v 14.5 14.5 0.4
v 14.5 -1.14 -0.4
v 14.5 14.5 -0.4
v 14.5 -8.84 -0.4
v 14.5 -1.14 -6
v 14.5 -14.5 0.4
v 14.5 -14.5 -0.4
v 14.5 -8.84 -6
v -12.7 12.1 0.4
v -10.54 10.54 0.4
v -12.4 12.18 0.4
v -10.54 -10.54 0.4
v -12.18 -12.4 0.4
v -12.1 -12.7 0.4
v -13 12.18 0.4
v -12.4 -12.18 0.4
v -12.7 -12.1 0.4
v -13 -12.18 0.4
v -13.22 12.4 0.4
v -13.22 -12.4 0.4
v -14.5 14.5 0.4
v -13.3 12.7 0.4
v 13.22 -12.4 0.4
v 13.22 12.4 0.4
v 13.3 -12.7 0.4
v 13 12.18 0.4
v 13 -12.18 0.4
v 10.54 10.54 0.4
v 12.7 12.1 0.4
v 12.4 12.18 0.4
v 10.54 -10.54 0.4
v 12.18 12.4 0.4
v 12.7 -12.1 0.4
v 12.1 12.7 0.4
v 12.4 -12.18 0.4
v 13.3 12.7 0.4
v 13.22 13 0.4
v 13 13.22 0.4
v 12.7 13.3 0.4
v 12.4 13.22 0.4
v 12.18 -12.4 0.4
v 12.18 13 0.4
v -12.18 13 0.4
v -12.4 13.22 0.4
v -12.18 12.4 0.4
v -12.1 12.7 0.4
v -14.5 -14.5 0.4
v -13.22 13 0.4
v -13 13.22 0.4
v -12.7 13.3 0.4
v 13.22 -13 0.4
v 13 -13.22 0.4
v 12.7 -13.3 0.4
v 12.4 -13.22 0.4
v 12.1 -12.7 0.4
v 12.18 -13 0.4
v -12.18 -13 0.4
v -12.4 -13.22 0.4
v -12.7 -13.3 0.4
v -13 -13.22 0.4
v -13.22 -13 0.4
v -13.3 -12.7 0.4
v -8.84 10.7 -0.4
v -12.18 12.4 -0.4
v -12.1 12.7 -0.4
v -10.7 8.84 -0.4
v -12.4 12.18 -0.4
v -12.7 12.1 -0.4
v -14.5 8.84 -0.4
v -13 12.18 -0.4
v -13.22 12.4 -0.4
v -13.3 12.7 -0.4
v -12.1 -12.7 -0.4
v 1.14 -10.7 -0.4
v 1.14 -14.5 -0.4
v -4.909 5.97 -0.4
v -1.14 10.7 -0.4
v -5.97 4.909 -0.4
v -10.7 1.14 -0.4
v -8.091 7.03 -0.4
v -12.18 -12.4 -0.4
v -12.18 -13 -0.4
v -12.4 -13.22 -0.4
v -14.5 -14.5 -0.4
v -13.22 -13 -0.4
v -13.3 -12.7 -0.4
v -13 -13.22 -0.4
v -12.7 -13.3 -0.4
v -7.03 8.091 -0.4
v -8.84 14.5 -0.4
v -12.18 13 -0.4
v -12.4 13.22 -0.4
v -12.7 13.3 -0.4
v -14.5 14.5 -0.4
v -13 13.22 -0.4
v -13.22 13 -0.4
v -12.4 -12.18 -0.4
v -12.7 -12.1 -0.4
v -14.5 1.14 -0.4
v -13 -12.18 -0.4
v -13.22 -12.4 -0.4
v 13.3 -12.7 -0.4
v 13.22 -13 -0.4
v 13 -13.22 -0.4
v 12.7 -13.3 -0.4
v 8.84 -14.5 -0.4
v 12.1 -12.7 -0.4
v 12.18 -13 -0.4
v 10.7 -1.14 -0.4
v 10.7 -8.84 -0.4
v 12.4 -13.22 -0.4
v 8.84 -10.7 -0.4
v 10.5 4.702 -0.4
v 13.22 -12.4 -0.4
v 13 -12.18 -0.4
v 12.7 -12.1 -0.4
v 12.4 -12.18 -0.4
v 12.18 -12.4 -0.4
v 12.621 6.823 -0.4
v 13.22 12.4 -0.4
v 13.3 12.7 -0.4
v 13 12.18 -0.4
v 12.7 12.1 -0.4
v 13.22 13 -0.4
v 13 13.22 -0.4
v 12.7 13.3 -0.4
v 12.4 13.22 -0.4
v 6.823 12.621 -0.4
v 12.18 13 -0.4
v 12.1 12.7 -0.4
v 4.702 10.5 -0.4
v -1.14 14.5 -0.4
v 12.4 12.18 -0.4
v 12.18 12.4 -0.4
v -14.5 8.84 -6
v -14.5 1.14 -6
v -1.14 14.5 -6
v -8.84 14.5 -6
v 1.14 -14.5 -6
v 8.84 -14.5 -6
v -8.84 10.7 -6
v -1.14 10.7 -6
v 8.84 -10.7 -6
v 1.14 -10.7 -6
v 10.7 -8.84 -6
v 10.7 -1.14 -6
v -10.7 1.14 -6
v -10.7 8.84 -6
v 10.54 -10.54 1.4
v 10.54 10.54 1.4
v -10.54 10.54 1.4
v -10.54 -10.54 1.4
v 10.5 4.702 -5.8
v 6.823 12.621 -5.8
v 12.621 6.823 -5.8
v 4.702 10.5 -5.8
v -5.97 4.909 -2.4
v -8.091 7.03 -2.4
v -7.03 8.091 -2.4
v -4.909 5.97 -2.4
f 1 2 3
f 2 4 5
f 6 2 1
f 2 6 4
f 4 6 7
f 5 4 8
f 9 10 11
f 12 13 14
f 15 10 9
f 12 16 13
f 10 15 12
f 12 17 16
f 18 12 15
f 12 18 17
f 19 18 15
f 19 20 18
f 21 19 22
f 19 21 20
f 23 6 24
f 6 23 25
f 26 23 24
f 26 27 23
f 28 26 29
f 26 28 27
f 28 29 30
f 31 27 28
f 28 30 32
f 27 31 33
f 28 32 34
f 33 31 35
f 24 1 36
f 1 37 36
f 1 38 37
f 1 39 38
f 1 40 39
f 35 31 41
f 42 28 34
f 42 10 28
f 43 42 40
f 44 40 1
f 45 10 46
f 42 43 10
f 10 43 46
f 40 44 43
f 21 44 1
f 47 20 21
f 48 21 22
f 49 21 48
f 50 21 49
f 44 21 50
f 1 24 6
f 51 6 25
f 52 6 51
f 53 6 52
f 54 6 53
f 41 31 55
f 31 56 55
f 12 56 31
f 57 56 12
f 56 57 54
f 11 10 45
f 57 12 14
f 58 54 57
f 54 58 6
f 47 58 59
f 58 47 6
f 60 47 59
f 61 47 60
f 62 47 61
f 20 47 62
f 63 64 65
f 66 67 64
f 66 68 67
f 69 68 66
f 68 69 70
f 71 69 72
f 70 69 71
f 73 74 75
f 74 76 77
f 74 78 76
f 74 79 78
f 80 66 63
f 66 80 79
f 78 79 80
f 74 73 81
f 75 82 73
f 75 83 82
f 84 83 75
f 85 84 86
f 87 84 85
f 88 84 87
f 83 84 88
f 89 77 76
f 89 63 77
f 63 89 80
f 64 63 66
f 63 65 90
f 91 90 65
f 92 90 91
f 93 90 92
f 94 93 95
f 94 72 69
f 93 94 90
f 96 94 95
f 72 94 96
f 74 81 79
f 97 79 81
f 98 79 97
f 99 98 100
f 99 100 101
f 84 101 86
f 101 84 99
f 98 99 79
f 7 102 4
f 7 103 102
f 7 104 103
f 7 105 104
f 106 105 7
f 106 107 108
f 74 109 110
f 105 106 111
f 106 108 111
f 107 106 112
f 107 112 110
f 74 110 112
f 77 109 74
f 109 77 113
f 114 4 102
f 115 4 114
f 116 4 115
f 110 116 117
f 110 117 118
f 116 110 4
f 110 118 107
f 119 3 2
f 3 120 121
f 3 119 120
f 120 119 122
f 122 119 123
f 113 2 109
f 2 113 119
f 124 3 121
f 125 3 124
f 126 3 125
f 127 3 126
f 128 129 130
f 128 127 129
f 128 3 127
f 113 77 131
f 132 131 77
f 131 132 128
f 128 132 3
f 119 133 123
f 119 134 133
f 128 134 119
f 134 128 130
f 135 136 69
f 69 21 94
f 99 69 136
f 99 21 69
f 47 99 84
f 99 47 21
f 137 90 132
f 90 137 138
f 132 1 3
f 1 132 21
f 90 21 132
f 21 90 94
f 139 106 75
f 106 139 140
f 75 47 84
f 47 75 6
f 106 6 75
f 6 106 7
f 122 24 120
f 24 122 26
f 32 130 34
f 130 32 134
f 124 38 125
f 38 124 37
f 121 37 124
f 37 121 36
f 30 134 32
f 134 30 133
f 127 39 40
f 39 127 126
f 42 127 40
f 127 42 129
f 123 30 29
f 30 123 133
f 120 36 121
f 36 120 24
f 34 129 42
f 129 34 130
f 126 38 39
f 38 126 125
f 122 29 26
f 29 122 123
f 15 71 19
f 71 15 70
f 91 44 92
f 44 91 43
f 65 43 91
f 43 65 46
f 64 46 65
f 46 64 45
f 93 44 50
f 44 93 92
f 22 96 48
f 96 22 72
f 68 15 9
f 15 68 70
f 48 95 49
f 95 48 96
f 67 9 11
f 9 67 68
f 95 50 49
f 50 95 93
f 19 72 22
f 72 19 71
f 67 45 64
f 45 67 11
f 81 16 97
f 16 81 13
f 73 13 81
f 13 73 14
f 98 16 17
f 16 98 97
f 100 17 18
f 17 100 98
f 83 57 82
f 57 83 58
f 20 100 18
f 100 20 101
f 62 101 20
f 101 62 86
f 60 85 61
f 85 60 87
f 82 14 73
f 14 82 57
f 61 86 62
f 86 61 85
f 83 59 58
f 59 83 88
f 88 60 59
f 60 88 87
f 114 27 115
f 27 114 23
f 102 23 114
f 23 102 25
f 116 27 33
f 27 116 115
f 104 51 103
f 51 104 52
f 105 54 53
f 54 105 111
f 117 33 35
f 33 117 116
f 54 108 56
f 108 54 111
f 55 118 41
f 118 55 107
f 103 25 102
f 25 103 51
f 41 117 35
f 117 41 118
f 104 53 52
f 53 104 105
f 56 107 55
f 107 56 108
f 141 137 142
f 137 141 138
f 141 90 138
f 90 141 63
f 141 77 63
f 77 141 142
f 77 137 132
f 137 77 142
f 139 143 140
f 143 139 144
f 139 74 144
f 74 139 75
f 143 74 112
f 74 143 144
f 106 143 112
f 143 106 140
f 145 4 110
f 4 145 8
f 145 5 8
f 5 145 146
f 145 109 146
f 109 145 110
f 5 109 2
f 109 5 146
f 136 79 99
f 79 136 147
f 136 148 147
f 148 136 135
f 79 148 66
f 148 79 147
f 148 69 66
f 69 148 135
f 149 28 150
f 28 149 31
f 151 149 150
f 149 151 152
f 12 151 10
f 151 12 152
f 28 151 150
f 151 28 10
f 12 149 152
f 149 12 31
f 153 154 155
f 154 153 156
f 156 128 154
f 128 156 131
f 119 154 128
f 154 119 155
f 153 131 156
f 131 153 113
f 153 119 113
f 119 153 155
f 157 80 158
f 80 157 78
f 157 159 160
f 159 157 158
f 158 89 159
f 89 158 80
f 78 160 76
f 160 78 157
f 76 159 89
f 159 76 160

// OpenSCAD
$fn = 12;

union() {
	difference() {
		cube(center = true, size = [29, 29, 0.8000000000]);
		translate(v = [12.7000000000, 12.7000000000, 0]) {
			cylinder(center = true, h = 100, r = 0.6000000000);
		}
		translate(v = [-12.7000000000, 12.7000000000, 0]) {
			cylinder(center = true, h = 100, r = 0.6000000000);
		}
		translate(v = [-12.7000000000, -12.7000000000, 0]) {
			cylinder(center = true, h = 100, r = 0.6000000000);
		}
		translate(v = [12.7000000000, -12.7000000000, 0]) {
			cylinder(center = true, h = 100, r = 0.6000000000);
		}
	}
	translate(v = [0, 0, 0.9000000000]) {
		cube(center = true, size = [21.0800000000, 21.0800000000, 1]);
	}
	translate(v = [7.6008621971, 7.6008621971, 0]) {
		rotate(a = [180, 0, -45]) {
			color(c = [0, 0, 1]) {
				translate(v = [0, -1.5000000000, 2.9000000000]) {
					cube(center = true, size = [8.2000000000, 3, 5.8000000000]);
				}
			}
		}
	}
	union() {
		translate(v = [-4.9900000000, 12.6000000000, -0.4000000000]) {
			rotate(a = [180, 0, 0]) {
				color(c = [1, 0, 0]) {
					translate(v = [0, 0, 2.8000000000]) {
						cube(center = true, size = [7.7000000000, 3.8000000000, 5.6000000000]);
					}
				}
			}
		}
		translate(v = [4.9900000000, -12.6000000000, -0.4000000000]) {
			rotate(a = [180, 0, 0]) {
				color(c = [1, 0, 0]) {
					translate(v = [0, 0, 2.8000000000]) {
						cube(center = true, size = [7.7000000000, 3.8000000000, 5.6000000000]);
					}
				}
			}
		}
		translate(v = [12.6000000000, -4.9900000000, -0.4000000000]) {
			rotate(a = [180, 0, 90]) {
				color(c = [1, 0, 0]) {
					translate(v = [0, 0, 2.8000000000]) {
						cube(center = true, size = [7.7000000000, 3.8000000000, 5.6000000000]);
					}
				}
			}
		}
		translate(v = [-12.6000000000, 4.9900000000, -0.4000000000]) {
			rotate(a = [180, 0, 90]) {
				color(c = [1, 0, 0]) {
					translate(v = [0, 0, 2.8000000000]) {
						cube(center = true, size = [7.7000000000, 3.8000000000, 5.6000000000]);
					}
				}
			}
		}
	}
	translate(v = [-6.5000000000, 6.5000000000, -0.4000000000]) {
		rotate(a = [180, 0, 45]) {
			color(c = [0, 0, 0]) {
				translate(v = [0, 0, 1.0000000000]) {
					cube(center = true, size = [1.5000000000, 3, 2]);
				}
			}
		}
	}
}
/***********************************************
*********      SolidPython code:      **********
************************************************
 
from solid import *
from solid.utils import *
from droneparts.fc import *
import os

SEGMENTS = 12
SCAD_ROOT = "../scad/"
SCAD_SUFFIX = ".scad"

parts = [ {'name': 'beebrain', 'category': 'fc', 'model': BeeBrain()}] 
def build():
    for part in parts:
        filename = part['name'] + SCAD_SUFFIX
        file = os.path.join(os.path.join(SCAD_ROOT, part['category']),
                            filename)
        file_header = '$fn = {};'.format(SEGMENTS)
        scad_render_to_file(part['model'].make(),  filepath = file, file_header =
                            file_header)




if __name__ == "__main__":
    build()
 
 
************************************************/
